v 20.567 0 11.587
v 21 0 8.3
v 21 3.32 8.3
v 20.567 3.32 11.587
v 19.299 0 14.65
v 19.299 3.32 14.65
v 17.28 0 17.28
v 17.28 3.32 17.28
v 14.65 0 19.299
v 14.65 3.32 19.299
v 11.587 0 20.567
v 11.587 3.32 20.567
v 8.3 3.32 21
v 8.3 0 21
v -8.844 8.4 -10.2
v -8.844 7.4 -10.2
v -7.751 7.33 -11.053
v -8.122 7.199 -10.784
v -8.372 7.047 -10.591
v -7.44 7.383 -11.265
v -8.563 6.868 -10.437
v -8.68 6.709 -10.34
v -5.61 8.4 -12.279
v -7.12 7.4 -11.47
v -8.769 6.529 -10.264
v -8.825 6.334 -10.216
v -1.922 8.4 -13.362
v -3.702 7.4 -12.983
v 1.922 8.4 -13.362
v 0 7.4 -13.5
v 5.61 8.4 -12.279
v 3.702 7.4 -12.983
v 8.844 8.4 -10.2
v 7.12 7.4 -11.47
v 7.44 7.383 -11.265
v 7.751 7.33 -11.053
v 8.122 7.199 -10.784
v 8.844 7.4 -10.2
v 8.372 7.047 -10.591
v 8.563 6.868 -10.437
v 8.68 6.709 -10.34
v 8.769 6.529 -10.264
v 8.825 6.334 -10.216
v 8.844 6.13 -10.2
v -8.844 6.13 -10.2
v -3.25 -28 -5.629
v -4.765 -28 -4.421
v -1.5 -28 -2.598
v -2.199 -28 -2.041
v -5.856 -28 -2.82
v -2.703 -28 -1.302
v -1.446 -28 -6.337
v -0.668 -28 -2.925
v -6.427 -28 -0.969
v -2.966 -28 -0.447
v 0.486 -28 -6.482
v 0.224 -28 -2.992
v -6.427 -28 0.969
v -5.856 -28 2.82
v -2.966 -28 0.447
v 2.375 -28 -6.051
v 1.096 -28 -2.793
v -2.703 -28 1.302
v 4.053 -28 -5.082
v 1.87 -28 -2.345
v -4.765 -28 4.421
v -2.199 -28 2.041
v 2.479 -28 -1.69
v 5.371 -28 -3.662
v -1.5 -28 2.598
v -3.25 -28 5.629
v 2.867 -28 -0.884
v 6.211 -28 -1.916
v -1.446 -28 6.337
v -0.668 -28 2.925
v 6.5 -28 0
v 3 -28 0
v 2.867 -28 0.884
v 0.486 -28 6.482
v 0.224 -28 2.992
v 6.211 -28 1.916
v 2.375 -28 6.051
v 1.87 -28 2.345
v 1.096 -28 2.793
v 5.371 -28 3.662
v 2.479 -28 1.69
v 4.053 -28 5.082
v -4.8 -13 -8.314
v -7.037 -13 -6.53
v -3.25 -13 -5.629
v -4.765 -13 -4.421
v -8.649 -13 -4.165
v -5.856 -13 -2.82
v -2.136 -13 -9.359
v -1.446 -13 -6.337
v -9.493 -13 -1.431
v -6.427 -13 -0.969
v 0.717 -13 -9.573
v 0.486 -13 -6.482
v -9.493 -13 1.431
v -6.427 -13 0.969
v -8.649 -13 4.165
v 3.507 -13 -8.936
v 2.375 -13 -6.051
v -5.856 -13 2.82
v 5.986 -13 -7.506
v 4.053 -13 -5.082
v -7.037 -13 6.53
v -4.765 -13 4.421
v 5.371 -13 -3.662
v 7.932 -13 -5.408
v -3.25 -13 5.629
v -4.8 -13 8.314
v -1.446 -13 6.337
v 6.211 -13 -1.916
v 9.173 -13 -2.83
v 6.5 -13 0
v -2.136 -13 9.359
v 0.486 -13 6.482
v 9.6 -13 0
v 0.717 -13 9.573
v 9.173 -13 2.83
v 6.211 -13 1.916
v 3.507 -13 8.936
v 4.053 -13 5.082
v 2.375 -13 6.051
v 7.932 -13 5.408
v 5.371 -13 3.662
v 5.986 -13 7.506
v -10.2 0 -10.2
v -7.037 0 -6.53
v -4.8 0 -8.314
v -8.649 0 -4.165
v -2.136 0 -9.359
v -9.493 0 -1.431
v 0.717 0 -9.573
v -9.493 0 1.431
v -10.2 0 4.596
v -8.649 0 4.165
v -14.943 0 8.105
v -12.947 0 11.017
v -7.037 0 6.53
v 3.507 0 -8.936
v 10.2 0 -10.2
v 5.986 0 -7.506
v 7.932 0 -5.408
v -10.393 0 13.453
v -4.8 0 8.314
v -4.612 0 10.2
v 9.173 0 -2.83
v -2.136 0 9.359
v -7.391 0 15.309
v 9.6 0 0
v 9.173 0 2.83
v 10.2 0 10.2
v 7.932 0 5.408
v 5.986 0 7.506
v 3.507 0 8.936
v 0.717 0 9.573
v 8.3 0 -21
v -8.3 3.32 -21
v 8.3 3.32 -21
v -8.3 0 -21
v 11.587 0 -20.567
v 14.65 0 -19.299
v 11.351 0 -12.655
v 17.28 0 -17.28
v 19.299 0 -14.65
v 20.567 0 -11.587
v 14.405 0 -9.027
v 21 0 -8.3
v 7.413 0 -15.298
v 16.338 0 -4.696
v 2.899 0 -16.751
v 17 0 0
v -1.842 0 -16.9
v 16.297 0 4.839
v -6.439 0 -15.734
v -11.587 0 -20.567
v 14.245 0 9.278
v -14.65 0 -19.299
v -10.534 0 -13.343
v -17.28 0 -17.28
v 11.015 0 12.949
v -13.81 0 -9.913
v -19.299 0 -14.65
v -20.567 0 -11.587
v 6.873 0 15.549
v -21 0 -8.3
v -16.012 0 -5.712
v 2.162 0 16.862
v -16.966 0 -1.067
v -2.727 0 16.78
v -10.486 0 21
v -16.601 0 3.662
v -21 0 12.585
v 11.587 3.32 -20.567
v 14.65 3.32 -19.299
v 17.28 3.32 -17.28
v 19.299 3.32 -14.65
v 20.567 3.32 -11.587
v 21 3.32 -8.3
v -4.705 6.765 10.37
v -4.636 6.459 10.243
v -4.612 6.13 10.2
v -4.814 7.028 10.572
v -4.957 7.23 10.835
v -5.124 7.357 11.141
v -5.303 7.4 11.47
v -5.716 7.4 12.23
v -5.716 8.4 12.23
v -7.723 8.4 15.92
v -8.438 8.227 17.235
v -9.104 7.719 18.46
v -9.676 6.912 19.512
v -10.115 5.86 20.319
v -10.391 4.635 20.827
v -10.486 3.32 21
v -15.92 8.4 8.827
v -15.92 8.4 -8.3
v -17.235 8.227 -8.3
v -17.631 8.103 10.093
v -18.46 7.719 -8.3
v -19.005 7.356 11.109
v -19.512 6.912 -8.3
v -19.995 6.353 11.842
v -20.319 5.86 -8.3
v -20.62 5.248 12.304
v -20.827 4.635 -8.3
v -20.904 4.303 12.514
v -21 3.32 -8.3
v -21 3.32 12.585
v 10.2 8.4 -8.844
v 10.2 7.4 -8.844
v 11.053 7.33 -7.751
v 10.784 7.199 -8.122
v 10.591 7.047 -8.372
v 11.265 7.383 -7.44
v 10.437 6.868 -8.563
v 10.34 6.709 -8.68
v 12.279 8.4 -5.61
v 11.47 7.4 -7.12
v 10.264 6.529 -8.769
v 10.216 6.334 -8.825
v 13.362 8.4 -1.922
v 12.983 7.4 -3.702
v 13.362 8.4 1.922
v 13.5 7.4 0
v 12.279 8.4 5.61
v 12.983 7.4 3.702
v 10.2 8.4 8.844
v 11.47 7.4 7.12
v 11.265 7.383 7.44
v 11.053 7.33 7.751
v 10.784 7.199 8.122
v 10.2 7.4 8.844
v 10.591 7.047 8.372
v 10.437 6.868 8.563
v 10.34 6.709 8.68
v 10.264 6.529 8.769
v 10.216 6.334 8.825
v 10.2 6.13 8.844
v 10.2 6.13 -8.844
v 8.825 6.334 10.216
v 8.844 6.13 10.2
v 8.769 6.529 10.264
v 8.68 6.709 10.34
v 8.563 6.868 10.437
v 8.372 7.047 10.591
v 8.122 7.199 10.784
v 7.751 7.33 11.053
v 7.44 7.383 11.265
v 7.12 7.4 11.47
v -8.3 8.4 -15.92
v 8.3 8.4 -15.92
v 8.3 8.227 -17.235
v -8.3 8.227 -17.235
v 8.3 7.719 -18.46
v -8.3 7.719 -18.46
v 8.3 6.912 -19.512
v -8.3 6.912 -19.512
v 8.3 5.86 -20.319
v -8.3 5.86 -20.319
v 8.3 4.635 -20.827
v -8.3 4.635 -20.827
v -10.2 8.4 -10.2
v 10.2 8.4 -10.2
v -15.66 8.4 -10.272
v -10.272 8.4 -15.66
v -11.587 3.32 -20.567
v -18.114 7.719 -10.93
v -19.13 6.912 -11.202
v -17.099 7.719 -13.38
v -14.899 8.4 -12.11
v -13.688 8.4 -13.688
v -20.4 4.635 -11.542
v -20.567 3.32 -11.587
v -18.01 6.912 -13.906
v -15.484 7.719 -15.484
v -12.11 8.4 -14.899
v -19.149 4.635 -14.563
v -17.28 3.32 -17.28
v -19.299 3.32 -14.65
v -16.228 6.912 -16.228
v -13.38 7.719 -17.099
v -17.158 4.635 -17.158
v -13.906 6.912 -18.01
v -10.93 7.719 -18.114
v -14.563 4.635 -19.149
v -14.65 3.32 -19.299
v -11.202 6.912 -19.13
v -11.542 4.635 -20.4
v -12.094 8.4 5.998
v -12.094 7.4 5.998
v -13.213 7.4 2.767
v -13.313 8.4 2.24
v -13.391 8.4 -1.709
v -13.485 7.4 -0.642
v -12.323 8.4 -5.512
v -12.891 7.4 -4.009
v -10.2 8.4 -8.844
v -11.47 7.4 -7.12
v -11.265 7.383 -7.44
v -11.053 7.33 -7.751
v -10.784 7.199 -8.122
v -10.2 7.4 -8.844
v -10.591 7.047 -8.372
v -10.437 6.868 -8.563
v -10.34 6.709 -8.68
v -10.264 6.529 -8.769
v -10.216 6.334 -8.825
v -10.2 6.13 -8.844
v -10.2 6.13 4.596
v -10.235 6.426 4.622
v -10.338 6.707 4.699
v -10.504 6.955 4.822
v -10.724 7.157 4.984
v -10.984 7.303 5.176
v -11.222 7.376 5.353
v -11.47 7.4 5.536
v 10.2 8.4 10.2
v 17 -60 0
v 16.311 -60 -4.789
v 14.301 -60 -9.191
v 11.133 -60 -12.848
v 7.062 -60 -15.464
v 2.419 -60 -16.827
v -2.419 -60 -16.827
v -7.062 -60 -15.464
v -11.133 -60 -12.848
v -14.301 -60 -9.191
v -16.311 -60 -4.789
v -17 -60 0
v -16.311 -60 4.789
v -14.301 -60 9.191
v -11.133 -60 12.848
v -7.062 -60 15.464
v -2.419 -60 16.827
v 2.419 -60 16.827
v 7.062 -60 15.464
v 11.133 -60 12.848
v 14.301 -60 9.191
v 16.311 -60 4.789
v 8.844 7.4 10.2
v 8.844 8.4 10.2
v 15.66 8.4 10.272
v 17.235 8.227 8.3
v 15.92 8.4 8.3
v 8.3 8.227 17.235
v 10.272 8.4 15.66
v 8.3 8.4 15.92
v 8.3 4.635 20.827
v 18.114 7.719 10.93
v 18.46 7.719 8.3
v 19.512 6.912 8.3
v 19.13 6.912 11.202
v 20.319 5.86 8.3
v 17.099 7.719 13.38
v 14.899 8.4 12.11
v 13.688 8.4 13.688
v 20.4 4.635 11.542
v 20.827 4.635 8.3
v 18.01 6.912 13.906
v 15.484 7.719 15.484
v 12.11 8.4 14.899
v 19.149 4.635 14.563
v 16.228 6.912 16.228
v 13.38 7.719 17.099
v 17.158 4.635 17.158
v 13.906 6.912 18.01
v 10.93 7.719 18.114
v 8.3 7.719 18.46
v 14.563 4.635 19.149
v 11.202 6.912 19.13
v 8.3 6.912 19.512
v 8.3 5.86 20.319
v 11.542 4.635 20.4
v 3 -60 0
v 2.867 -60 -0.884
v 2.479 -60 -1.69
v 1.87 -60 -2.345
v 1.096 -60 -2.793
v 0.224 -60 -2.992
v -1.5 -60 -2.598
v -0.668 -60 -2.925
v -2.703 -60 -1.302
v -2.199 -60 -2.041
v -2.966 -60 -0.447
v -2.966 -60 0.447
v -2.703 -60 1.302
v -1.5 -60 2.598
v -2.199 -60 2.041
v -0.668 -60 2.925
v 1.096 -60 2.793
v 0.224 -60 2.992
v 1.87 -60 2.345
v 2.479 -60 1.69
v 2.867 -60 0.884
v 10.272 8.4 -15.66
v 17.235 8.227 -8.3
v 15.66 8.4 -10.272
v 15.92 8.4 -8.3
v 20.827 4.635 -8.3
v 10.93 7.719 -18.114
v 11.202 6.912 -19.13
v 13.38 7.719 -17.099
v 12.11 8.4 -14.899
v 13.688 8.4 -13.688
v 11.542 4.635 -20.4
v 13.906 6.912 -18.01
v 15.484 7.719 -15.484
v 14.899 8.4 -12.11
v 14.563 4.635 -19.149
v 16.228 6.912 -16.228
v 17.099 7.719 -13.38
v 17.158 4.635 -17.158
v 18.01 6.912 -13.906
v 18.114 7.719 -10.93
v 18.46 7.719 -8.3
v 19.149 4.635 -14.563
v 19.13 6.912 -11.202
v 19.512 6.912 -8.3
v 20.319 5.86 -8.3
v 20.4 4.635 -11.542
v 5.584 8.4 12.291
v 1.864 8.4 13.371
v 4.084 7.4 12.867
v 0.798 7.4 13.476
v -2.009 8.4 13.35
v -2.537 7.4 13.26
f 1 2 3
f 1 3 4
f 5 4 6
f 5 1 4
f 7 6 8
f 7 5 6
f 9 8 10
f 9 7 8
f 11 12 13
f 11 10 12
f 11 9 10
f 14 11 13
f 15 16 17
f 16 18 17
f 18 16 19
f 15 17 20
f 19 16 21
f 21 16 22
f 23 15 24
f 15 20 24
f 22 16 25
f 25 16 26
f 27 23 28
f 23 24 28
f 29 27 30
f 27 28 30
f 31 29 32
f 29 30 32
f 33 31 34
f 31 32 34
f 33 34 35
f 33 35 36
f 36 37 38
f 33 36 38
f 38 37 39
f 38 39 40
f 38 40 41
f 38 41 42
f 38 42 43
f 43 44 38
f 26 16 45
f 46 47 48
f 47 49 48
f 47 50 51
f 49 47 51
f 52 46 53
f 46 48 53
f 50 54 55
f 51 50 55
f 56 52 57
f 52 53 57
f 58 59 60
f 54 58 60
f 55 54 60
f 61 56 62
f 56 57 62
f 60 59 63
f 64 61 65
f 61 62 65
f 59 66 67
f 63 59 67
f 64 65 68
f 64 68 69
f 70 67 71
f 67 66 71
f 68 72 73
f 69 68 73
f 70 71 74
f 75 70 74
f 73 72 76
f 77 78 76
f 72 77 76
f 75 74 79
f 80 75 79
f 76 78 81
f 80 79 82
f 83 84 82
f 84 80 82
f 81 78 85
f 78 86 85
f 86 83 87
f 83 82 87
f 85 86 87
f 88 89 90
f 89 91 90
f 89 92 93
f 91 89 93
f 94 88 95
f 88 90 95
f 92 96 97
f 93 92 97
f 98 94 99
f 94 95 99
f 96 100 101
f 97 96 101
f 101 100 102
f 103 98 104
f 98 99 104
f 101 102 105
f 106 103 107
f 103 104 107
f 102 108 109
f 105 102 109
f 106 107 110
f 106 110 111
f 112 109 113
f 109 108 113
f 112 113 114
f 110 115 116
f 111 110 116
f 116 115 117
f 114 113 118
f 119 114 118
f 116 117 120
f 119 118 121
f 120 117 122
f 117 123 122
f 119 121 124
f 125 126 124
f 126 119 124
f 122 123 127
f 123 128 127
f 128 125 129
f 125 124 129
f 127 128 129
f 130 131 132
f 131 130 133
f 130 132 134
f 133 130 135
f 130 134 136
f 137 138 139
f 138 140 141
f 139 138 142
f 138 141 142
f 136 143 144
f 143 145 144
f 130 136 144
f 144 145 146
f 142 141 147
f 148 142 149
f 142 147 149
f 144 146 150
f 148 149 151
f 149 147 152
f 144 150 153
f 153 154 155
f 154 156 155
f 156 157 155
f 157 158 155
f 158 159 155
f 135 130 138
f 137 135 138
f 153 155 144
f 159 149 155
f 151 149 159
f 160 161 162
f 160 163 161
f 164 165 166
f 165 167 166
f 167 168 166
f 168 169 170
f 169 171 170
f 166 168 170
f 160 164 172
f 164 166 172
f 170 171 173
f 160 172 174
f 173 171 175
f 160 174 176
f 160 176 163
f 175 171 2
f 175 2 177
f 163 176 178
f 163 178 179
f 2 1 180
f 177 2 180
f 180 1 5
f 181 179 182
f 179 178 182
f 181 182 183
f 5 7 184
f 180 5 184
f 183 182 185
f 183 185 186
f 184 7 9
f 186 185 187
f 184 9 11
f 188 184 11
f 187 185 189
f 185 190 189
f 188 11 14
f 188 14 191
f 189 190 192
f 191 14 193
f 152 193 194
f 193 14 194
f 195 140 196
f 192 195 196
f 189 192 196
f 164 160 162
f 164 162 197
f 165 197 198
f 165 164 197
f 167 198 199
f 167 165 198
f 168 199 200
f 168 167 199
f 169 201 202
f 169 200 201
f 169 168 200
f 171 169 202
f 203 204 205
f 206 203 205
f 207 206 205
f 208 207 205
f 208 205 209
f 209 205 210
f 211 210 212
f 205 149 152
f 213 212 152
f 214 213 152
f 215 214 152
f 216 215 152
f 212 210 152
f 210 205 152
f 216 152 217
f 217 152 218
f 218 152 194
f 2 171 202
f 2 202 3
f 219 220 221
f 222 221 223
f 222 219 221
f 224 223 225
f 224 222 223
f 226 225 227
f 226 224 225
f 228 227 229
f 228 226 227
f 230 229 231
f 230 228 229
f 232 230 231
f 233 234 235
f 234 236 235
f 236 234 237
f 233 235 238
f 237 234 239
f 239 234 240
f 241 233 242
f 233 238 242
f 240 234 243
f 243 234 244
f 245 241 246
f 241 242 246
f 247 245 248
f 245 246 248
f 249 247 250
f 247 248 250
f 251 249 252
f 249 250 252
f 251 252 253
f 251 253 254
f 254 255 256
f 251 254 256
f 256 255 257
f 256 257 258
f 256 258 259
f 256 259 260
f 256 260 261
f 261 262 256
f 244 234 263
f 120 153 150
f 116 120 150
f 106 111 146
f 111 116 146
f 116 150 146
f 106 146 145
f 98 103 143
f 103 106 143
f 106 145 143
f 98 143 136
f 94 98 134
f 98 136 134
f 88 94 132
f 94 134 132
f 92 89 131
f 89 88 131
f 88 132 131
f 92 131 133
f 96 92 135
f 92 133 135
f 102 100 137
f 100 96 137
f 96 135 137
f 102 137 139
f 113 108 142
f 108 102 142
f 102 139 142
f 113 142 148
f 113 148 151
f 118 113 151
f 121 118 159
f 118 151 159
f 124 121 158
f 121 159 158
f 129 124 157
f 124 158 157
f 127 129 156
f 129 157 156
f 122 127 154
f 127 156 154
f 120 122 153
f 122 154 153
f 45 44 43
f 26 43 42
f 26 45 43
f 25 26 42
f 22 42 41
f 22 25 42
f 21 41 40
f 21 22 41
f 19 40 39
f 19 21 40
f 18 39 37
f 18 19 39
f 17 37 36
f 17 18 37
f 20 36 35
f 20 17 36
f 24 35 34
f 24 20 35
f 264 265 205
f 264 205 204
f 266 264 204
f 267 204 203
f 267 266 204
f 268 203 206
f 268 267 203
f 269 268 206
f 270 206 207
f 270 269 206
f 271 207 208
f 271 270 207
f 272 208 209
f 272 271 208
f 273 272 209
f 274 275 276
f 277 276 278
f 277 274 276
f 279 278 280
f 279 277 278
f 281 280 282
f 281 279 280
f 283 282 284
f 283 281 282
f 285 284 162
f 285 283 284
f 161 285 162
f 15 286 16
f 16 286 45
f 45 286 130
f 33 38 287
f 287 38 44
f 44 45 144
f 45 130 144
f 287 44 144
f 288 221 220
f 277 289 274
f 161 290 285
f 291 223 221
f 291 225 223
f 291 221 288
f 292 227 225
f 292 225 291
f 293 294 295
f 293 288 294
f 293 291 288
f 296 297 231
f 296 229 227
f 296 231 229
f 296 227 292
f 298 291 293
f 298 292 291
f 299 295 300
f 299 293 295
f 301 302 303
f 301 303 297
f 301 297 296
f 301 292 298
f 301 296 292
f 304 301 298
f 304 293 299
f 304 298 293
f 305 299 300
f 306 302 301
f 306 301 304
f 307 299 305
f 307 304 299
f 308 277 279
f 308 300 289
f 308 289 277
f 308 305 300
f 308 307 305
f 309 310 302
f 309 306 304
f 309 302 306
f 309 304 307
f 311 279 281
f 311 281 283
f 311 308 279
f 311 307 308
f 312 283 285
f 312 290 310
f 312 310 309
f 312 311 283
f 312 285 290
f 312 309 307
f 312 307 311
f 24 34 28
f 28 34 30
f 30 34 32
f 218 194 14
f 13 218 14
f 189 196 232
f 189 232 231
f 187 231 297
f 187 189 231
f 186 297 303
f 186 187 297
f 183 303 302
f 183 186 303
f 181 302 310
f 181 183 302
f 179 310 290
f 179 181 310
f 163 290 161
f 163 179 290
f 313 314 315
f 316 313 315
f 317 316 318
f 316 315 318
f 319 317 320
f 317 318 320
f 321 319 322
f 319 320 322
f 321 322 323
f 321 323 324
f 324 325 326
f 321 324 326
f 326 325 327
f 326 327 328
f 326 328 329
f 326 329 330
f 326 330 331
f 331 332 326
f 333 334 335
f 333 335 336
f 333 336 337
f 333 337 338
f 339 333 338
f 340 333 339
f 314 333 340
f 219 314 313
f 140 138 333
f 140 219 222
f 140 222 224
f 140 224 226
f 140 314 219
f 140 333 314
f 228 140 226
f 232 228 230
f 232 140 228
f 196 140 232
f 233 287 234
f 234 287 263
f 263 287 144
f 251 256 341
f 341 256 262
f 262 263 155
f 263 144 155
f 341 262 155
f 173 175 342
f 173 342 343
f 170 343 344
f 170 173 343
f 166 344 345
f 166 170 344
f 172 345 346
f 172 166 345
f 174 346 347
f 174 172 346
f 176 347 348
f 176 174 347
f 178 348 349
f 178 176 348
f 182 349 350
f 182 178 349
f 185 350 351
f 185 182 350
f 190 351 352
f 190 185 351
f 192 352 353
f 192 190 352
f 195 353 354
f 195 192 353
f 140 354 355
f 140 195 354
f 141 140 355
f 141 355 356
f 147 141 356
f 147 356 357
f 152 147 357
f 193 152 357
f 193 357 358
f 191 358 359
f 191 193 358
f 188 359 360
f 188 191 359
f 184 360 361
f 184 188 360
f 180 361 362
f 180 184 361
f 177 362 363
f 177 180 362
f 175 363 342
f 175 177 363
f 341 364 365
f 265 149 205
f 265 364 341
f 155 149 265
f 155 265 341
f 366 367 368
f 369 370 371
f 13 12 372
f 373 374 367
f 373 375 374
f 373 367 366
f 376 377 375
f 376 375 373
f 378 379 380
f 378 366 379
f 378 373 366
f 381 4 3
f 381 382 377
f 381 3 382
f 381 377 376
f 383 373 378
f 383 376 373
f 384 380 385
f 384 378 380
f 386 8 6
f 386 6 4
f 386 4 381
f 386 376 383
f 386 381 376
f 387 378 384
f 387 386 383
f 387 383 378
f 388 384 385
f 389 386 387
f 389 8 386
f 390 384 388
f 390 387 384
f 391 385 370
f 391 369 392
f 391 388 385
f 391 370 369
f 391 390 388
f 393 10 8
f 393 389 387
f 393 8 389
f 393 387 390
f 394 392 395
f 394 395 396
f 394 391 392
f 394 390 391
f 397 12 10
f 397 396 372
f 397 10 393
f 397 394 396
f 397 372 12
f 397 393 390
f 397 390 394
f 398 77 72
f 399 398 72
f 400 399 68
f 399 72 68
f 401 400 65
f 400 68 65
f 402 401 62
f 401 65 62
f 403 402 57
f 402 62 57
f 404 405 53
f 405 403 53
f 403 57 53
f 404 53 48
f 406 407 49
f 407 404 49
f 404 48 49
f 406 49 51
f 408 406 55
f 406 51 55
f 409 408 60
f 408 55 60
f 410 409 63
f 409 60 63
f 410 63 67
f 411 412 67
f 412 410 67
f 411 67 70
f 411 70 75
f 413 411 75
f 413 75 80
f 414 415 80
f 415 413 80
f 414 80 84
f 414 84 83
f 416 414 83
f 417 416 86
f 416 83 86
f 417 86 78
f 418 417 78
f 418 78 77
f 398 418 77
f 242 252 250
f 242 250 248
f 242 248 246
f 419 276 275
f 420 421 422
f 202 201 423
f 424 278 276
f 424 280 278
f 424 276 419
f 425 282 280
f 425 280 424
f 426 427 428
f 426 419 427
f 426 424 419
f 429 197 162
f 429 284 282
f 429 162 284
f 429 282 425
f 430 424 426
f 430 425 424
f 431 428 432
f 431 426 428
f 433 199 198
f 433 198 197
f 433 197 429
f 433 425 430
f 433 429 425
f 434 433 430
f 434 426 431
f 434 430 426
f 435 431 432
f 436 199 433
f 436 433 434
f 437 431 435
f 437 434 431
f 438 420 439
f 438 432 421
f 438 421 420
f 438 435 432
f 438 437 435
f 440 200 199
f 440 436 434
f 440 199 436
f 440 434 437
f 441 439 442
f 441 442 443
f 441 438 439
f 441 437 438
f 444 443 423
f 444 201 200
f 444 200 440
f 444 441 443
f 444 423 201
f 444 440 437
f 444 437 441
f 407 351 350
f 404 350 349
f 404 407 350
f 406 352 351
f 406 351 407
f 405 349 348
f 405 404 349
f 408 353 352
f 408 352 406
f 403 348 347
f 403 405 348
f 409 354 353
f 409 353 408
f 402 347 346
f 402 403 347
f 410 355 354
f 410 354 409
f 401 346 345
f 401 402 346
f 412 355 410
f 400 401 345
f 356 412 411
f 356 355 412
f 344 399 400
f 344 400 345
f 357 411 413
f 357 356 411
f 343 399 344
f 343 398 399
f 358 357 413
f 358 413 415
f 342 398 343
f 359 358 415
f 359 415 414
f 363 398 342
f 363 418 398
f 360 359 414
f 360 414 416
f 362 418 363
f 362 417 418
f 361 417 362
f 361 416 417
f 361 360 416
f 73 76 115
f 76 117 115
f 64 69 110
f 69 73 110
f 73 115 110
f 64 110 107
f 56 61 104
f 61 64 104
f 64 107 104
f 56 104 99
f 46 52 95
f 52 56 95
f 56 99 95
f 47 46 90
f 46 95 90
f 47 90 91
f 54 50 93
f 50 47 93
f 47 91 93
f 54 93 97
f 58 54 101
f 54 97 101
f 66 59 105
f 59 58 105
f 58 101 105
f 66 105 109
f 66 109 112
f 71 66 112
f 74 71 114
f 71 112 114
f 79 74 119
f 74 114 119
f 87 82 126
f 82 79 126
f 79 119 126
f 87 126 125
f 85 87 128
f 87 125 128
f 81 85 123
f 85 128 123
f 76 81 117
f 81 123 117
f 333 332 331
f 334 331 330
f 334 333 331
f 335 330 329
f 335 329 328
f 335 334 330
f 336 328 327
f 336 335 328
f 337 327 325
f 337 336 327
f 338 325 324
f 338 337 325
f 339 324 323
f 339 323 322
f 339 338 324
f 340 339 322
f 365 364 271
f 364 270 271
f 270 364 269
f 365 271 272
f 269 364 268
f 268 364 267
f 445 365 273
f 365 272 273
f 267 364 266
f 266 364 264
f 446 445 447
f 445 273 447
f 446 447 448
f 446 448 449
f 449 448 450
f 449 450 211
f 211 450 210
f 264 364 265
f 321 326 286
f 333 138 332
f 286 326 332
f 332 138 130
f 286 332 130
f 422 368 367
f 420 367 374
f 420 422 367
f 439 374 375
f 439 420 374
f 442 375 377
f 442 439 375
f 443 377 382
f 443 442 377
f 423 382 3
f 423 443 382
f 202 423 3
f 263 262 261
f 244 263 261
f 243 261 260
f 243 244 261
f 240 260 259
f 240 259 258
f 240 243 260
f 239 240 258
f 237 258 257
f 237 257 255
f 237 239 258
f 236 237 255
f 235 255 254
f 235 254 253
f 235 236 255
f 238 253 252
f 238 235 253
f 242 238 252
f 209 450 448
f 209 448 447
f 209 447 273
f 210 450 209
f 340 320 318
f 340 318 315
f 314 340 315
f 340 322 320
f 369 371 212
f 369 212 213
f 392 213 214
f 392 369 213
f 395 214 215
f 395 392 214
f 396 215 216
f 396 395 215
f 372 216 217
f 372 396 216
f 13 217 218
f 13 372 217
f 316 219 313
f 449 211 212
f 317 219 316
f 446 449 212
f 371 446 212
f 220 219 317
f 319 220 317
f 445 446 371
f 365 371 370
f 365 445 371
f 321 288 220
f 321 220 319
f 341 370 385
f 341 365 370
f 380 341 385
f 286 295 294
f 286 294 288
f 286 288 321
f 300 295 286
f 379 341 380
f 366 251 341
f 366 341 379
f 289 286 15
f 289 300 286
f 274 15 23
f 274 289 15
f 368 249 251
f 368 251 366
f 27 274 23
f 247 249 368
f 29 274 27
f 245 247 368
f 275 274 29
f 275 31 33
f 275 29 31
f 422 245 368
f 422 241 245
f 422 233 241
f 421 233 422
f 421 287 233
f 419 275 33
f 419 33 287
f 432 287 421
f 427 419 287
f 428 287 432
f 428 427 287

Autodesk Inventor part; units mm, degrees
ref_plane "YZ Plane" through (0, 0, 0) normal (1, 0, 0) x (0, 1, 0)
ref_plane "XZ Plane" through (0, 0, 0) normal (0, 1, 0) x (-1, 0, 0)
ref_plane "XY Plane" through (0, 0, 0) normal (0, 0, 1) x (1, 0, 0)
sketch "Sketch2" plane through (0, 0, 0) normal (0, 1, 0) x (-1, 0, 0)
  line L0 (21, 21) -> (-21, 21)
  line L1 (-21, 21) -> (-21, -21)
  line L2 (-21, -21) -> (21, -21)
  line L3 (21, -21) -> (21, 21)
  line L4 (21, 21) -> (-21, -21) construction
  line L5 (-21, 21) -> (21, -21) construction
  point P0 (0, 0)
  point P1 (-21, 0)
  dimension "d1" = 42
  dimension "d2" = 42
extrude "Extrusion1" add sketch "Sketch2" along normal blind 7.4
sketch "Sketch3" plane through (0, 7.4, 0) normal (0, 1, 0) x (1, 0, 0)
  line L0 (-10.2, -10.2) -> (10.2, -10.2)
  line L1 (10.2, -10.2) -> (10.2, 10.2)
  line L2 (10.2, 10.2) -> (-10.2, 10.2)
  line L3 (-10.2, 10.2) -> (-10.2, -10.2)
  line L4 (-10.2, -10.2) -> (10.2, 10.2) construction
  line L5 (10.2, -10.2) -> (-10.2, 10.2) construction
  line L6 (-4.612, -10.2) -> (-10.4855, -21)
  line L7 (-10.2, -4.5965) -> (-21, -12.5849)
  line L8 (-21, 21) -> (-21, -21) projected
  line L9 (-21, -12.5849) -> (-21, -21)
  line L10 (-21, -21) -> (-10.4855, -21)
  line L11 (-21, -21) -> (21, -21) projected
  line L12 (-10.2, -10.2) -> (-10.2, -4.5965)
  point P0 (0, 0)
  dimension "d5" = 20.4
  dimension "d6" = 20.4
  dimension "d9" = 5.588
extrude "Extrusion2" cut sketch "Sketch3" against normal blind 7.4
sketch "Sketch4" plane through (0, 7.4, 0) normal (0, 1, 0) x (1, 0, 0)
  circle A0 centre (0, 0) radius 13.5
  line L0 (-10.2, -4.5965) -> (-21, -12.5849) projected
  line L1 (-12.0945, -5.9978) -> (-21, -12.5849)
  line L2 (-21, -12.5849) -> (-21, 21)
  line L3 (-21, 21) -> (21, 21)
  line L4 (21, 21) -> (21, -21.0478)
  line L5 (-4.612, -10.2) -> (-10.4855, -21) projected
  line L6 (-5.7161, -12.2301) -> (-10.4855, -21)
  line L7 (-10.4855, -21) -> (21, -21) projected
  line L8 (21, -21) -> (-10.4855, -21)
  line L9 (10.2, 10.2) -> (10.2, -10.2) projected
  line L10 (8.8436, -10.2) -> (10.2, -10.2)
  line L11 (10.2, -10.2) -> (10.2, -8.8436)
  line L12 (-10.2, 10.2) -> (10.2, 10.2) projected
  line L13 (8.8436, 10.2) -> (10.2, 10.2)
  line L14 (10.2, 10.2) -> (10.2, 8.8436)
  line L15 (-10.2, -4.5965) -> (-10.2, 10.2) projected
  line L16 (-10.2, 8.8436) -> (-10.2, 10.2)
  line L17 (-10.2, 10.2) -> (-8.8436, 10.2)
  point P0 (-8.8436, 10.2)
  point P1 (10.2, -8.8436)
  dimension "d10" = 27
extrude "Extrusion3" add sketch "Sketch4" along normal blind 1 contours A0 L9 L12 L15 L0 L2 L3 L4 L7 L5 L10
fillet "Fillet4" radius 12.7 3 edges at (21, 4.2, 21) (21, 4.2, -21) (-21, 4.2, -21)
fillet "Fillet5" radius 5.08 7 edges at (-1.0927, 8.4, 21) (21, 8.4, 0) (17.2803, 8.4, -17.2803) (0, 8.4, -21) (-17.2803, 8.4, -17.2803) (-21, 8.4, 2.1424) (17.2803, 8.4, 17.2803)
fillet "Fillet6" radius 1.27 4 edges at (2.1158, 7.4, 10.2) (-10.2, 7.4, -2.1236) (0, 7.4, -10.2) (10.2, 7.4, 0)
sketch "Sketch5" plane through (0, 0, 0) normal (0, -1, 0) x (1, 0, 0)
  circle A0 centre (0, 0) radius 17
  circle A1 centre (0, 0) radius 9.6
  dimension "d19" = 34
  dimension "d20" = 19.2
extrude "Extrusion4" add sketch "Sketch5" along normal blind 13
sketch "Sketch6" plane through (0, -13, 0) normal (0, -1, 0) x (1, 0, 0)
  circle A0 centre (0, 0) radius 17
  circle A1 centre (0, 0) radius 6.5
  dimension "d23" = 13
extrude "Extrusion5" add sketch "Sketch6" along normal blind 15
sketch "Sketch8" plane through (0, -28, 0) normal (0, -1, 0) x (1, 0, 0)
  circle A0 centre (0, 0) radius 17
  circle A1 centre (0, 0) radius 3
  dimension "d29" = 6
  dimension "d32" = 34
extrude "Extrusion7" add sketch "Sketch8" along normal blind 32
properties part number "Wheel Adaptor"
